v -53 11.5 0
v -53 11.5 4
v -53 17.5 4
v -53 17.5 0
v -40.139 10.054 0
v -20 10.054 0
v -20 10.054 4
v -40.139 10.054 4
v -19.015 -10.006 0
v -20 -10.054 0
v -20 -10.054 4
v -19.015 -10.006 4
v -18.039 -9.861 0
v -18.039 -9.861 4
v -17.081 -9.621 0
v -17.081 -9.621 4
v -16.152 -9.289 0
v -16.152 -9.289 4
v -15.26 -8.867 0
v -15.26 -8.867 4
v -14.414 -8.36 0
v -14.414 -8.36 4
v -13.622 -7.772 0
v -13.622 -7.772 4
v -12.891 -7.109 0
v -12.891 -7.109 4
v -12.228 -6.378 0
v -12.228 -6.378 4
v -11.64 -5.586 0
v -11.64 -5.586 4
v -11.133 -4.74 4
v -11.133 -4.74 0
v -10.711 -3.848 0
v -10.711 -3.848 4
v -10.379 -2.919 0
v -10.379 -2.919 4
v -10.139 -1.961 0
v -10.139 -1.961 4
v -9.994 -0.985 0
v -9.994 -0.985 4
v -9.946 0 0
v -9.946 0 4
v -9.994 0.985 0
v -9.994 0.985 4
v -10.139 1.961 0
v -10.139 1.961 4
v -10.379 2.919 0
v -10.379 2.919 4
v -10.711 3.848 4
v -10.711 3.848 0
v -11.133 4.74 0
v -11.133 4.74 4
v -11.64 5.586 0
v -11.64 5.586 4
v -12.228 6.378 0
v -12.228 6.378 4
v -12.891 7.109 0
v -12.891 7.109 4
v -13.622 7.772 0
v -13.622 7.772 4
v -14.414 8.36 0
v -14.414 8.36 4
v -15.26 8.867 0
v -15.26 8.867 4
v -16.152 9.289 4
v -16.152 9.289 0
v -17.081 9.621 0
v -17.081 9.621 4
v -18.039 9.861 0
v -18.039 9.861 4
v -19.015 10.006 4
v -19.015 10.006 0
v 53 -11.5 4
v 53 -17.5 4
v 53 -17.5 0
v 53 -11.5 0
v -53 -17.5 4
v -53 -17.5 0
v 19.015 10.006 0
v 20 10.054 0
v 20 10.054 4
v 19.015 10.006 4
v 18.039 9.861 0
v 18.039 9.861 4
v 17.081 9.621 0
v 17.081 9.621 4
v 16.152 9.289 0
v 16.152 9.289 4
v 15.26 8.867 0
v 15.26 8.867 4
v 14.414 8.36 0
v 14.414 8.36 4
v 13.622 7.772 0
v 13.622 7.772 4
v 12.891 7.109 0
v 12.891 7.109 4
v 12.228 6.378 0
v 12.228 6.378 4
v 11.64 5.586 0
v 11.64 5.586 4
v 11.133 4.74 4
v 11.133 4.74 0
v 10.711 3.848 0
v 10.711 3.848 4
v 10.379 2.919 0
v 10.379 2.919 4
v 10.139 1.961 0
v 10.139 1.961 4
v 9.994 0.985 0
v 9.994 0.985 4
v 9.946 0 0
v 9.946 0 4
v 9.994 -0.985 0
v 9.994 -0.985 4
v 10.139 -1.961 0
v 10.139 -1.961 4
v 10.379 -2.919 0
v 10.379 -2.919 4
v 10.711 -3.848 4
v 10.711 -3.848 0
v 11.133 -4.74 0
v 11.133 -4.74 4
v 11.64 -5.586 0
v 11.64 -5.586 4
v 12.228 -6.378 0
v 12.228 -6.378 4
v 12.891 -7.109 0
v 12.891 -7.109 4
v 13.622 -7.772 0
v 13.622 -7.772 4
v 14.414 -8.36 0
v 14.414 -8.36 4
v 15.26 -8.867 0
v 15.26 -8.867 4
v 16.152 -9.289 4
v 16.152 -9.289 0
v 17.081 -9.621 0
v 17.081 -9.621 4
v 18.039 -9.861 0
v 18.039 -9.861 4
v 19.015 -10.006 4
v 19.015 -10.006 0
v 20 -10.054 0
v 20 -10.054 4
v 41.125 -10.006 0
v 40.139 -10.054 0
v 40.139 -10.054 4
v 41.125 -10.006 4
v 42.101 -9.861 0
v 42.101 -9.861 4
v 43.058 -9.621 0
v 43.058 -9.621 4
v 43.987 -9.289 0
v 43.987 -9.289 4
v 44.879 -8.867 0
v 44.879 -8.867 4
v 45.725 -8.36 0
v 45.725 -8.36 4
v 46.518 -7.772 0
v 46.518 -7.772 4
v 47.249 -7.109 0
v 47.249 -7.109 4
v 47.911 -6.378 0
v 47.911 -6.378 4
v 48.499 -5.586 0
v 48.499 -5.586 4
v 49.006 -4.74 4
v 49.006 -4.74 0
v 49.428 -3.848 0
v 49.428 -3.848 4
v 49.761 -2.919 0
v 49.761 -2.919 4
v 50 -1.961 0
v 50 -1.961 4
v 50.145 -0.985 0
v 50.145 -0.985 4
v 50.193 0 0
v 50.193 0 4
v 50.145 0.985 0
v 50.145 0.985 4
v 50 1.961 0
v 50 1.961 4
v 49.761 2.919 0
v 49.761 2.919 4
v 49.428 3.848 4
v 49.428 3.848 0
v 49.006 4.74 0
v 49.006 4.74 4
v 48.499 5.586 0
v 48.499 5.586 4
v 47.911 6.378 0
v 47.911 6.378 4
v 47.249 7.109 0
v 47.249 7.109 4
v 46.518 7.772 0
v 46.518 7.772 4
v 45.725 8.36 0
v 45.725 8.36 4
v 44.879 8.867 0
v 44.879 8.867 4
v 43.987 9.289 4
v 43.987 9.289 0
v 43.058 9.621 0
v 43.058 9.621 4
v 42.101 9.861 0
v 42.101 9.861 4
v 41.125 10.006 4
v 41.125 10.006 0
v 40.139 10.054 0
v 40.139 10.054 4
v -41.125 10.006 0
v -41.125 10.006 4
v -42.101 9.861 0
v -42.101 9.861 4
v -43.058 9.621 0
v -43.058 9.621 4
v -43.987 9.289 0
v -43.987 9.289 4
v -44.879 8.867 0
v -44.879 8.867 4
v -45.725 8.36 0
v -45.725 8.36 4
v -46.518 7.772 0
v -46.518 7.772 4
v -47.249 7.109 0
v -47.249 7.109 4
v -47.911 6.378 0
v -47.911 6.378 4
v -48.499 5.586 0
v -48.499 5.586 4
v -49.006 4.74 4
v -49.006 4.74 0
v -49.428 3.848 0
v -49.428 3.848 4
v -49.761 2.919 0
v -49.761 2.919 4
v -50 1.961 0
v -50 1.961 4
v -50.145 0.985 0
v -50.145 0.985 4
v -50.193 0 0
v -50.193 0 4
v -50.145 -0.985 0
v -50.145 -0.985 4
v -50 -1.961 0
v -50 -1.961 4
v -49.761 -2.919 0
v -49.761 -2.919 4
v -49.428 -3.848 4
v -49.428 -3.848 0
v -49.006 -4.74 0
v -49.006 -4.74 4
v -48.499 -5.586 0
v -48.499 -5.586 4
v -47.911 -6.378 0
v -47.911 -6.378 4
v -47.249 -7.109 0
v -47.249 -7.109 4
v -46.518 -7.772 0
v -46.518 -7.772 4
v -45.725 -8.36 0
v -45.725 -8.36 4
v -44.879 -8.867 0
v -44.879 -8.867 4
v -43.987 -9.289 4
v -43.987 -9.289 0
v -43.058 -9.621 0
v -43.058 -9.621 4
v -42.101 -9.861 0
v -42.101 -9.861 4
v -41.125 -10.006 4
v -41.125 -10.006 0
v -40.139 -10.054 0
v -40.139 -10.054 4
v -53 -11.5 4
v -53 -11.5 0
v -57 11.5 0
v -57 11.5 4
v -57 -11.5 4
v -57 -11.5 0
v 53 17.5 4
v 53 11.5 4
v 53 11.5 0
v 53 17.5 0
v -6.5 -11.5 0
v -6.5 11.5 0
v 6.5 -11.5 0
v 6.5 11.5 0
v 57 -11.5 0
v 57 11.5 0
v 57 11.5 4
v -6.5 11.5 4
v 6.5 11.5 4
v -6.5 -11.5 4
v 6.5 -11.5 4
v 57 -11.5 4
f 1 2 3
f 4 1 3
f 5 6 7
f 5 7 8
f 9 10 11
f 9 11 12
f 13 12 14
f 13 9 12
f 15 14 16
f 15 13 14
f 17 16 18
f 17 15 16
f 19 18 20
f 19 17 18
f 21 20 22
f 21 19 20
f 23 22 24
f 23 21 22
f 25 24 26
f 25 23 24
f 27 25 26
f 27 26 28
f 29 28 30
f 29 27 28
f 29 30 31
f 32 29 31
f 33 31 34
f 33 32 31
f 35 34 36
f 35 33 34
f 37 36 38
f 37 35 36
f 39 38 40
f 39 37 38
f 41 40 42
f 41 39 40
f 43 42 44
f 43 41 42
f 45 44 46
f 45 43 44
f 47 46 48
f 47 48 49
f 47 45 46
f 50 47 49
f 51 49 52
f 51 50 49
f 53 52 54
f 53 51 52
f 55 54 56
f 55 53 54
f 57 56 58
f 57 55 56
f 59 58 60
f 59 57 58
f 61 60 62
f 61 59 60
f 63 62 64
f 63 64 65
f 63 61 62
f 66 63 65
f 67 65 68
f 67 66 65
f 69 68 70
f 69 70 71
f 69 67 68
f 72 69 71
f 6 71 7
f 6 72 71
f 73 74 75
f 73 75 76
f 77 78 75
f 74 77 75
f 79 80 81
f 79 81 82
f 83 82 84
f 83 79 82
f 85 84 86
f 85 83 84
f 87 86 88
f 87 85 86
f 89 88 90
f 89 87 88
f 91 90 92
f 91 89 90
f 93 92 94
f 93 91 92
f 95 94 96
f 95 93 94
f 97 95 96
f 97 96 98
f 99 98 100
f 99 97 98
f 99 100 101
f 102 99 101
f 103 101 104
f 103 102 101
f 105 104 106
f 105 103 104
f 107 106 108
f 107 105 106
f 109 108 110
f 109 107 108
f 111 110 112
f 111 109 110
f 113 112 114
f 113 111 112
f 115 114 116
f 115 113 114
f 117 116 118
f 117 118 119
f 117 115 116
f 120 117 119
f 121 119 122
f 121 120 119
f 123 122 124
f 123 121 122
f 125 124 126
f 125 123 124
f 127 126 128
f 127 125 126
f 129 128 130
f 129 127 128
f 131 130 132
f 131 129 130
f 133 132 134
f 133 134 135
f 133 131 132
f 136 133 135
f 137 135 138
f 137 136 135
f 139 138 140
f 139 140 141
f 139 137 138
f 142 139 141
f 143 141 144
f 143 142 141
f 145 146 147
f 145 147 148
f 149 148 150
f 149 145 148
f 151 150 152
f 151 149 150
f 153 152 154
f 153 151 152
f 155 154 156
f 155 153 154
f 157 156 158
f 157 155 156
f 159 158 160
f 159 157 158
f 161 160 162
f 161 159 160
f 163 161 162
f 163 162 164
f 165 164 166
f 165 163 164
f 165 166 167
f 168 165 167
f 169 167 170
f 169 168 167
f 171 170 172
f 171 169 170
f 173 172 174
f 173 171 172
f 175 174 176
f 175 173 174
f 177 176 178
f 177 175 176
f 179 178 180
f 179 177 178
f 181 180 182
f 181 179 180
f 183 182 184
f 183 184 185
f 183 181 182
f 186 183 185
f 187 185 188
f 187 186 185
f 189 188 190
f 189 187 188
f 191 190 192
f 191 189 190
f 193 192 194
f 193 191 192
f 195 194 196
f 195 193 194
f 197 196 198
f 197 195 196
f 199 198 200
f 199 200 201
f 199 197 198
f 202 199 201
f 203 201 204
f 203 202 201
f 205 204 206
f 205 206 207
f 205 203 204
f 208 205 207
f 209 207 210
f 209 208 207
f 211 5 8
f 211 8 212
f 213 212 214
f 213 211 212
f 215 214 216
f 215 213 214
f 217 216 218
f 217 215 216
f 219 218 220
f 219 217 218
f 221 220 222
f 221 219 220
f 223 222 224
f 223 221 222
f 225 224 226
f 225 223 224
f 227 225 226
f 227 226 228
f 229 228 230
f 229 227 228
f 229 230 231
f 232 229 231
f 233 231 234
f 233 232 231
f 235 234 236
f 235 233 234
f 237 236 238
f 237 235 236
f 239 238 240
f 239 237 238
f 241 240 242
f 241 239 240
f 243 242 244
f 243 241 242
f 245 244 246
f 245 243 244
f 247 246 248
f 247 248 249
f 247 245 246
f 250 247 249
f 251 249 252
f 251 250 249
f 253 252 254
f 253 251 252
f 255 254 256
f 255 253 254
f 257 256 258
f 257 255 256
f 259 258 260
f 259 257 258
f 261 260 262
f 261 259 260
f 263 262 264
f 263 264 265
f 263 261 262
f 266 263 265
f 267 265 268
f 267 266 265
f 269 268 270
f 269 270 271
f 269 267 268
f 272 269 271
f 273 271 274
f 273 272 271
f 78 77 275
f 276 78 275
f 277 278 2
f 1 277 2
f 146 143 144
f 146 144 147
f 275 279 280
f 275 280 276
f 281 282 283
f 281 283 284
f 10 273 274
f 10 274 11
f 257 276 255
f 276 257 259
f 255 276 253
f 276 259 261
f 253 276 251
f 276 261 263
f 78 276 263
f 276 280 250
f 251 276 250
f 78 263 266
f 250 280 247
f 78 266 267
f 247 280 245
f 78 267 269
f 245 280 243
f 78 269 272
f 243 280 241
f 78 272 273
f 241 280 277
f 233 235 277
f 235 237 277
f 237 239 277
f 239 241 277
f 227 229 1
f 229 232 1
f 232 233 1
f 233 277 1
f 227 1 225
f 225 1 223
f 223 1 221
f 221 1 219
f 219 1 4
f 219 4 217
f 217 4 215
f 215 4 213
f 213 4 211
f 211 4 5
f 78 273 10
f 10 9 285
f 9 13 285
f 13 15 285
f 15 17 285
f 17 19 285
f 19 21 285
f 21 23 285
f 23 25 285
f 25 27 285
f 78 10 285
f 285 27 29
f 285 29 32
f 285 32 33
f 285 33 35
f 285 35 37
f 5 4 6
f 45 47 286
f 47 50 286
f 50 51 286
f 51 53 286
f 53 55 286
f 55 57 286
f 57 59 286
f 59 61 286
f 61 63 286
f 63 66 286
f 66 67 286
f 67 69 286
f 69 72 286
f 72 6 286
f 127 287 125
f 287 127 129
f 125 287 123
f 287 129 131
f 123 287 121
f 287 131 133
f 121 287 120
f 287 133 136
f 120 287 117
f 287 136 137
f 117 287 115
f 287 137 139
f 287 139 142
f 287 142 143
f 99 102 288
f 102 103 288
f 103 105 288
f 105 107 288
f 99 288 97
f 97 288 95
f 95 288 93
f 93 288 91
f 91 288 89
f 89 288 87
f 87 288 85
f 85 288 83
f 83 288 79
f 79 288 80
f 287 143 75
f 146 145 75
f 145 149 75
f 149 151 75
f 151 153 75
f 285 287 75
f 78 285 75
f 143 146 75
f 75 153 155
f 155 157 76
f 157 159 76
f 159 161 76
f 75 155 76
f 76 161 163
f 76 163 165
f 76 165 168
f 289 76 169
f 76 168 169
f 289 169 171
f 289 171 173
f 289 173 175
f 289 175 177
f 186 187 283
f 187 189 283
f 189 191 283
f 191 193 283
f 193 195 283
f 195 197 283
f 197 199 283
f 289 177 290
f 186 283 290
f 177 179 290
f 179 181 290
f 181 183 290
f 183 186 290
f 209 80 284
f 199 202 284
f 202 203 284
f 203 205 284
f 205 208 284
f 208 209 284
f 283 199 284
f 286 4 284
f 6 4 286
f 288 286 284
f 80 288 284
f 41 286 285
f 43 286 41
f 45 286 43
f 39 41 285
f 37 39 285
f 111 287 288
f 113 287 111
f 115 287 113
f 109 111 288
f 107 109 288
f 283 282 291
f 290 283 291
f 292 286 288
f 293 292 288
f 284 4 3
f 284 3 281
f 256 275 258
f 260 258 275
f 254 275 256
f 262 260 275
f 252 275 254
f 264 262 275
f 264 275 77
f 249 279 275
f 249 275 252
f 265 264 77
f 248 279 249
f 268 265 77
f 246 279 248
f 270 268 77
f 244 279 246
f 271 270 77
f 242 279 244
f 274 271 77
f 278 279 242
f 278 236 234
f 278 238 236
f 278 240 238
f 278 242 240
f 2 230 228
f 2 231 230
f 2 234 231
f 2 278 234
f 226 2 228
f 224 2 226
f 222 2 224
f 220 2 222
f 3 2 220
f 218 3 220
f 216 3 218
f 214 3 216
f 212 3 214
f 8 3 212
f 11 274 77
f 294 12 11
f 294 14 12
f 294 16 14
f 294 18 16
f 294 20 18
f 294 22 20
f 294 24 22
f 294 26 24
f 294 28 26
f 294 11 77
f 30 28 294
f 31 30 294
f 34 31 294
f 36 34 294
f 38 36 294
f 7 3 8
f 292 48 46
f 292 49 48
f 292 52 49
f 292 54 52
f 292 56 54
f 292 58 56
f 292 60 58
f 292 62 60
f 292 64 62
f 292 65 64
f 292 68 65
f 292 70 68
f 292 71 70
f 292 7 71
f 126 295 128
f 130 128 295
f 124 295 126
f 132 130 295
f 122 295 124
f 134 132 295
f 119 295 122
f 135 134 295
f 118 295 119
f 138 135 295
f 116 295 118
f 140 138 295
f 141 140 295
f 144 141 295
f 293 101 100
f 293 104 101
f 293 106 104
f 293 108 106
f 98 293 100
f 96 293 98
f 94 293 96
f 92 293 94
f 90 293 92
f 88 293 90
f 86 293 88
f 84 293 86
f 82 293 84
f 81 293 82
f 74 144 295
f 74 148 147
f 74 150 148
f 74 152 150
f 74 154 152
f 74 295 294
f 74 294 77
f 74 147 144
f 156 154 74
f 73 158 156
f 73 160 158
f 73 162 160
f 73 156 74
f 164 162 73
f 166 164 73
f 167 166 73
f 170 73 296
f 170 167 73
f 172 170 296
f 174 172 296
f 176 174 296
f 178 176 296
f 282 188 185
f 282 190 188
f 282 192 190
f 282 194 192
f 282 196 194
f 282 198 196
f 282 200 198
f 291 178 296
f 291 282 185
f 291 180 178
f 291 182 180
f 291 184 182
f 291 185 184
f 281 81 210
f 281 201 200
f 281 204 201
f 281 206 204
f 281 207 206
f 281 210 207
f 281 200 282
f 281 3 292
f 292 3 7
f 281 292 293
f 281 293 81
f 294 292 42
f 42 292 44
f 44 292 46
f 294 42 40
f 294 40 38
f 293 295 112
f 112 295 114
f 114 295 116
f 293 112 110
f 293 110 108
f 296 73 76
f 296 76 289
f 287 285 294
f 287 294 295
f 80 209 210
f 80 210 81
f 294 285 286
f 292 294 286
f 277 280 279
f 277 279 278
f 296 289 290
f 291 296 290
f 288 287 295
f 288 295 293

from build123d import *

# Parameters (mm, degrees)
SKETCH_W     = 114
SKETCH_H     = 35
SKETCH_W_2   = 13
SKETCH_H_2   = 23
PAD_DEPTH    = 4
SKETCH001_W  = 4
SKETCH001_H  = 6
POCKET_DEPTH = 5


with BuildPart() as part:
    # Sketch → Pad (new body)
    with BuildSketch(Plane.XY):
        Rectangle(SKETCH_W, SKETCH_H)
        Rectangle(SKETCH_W_2, SKETCH_H_2, mode=Mode.SUBTRACT)
        with BuildLine():
            ThreePointArc((-40.139128, 10.054315), (-50.193443, 0), (-40.139128, -10.054315))
            Line((-40.139128, -10.054315), (-20, -10.054315))
            ThreePointArc((-20, -10.054315), (-9.945685, 0), (-20, 10.054315))
            Line((-20, 10.054315), (-40.139128, 10.054315))
        make_face(mode=Mode.SUBTRACT)
        with BuildLine():
            ThreePointArc((20, 10.054315), (9.945685, 0), (20, -10.054315))
            Line((20, -10.054315), (40.139128, -10.054315))
            ThreePointArc((40.139128, -10.054315), (50.193443, 0), (40.139128, 10.054315))
            Line((40.139128, 10.054315), (20, 10.054315))
        make_face(mode=Mode.SUBTRACT)
    extrude(amount=PAD_DEPTH)

    # Sketch001 (on Face18 of Pad) → Pocket (cut)
    with BuildSketch(Plane.XY.offset(4)):
        with Locations((-55, 14.5)):
            Rectangle(SKETCH001_W, SKETCH001_H)
        with Locations((-55, -14.5)):
            Rectangle(SKETCH001_W, SKETCH001_H)
        with Locations((55, -14.5)):
            Rectangle(SKETCH001_W, SKETCH001_H)
        with Locations((55, 14.5)):
            Rectangle(SKETCH001_W, SKETCH001_H)
    extrude(amount=-POCKET_DEPTH, mode=Mode.SUBTRACT)


solid = part.part
